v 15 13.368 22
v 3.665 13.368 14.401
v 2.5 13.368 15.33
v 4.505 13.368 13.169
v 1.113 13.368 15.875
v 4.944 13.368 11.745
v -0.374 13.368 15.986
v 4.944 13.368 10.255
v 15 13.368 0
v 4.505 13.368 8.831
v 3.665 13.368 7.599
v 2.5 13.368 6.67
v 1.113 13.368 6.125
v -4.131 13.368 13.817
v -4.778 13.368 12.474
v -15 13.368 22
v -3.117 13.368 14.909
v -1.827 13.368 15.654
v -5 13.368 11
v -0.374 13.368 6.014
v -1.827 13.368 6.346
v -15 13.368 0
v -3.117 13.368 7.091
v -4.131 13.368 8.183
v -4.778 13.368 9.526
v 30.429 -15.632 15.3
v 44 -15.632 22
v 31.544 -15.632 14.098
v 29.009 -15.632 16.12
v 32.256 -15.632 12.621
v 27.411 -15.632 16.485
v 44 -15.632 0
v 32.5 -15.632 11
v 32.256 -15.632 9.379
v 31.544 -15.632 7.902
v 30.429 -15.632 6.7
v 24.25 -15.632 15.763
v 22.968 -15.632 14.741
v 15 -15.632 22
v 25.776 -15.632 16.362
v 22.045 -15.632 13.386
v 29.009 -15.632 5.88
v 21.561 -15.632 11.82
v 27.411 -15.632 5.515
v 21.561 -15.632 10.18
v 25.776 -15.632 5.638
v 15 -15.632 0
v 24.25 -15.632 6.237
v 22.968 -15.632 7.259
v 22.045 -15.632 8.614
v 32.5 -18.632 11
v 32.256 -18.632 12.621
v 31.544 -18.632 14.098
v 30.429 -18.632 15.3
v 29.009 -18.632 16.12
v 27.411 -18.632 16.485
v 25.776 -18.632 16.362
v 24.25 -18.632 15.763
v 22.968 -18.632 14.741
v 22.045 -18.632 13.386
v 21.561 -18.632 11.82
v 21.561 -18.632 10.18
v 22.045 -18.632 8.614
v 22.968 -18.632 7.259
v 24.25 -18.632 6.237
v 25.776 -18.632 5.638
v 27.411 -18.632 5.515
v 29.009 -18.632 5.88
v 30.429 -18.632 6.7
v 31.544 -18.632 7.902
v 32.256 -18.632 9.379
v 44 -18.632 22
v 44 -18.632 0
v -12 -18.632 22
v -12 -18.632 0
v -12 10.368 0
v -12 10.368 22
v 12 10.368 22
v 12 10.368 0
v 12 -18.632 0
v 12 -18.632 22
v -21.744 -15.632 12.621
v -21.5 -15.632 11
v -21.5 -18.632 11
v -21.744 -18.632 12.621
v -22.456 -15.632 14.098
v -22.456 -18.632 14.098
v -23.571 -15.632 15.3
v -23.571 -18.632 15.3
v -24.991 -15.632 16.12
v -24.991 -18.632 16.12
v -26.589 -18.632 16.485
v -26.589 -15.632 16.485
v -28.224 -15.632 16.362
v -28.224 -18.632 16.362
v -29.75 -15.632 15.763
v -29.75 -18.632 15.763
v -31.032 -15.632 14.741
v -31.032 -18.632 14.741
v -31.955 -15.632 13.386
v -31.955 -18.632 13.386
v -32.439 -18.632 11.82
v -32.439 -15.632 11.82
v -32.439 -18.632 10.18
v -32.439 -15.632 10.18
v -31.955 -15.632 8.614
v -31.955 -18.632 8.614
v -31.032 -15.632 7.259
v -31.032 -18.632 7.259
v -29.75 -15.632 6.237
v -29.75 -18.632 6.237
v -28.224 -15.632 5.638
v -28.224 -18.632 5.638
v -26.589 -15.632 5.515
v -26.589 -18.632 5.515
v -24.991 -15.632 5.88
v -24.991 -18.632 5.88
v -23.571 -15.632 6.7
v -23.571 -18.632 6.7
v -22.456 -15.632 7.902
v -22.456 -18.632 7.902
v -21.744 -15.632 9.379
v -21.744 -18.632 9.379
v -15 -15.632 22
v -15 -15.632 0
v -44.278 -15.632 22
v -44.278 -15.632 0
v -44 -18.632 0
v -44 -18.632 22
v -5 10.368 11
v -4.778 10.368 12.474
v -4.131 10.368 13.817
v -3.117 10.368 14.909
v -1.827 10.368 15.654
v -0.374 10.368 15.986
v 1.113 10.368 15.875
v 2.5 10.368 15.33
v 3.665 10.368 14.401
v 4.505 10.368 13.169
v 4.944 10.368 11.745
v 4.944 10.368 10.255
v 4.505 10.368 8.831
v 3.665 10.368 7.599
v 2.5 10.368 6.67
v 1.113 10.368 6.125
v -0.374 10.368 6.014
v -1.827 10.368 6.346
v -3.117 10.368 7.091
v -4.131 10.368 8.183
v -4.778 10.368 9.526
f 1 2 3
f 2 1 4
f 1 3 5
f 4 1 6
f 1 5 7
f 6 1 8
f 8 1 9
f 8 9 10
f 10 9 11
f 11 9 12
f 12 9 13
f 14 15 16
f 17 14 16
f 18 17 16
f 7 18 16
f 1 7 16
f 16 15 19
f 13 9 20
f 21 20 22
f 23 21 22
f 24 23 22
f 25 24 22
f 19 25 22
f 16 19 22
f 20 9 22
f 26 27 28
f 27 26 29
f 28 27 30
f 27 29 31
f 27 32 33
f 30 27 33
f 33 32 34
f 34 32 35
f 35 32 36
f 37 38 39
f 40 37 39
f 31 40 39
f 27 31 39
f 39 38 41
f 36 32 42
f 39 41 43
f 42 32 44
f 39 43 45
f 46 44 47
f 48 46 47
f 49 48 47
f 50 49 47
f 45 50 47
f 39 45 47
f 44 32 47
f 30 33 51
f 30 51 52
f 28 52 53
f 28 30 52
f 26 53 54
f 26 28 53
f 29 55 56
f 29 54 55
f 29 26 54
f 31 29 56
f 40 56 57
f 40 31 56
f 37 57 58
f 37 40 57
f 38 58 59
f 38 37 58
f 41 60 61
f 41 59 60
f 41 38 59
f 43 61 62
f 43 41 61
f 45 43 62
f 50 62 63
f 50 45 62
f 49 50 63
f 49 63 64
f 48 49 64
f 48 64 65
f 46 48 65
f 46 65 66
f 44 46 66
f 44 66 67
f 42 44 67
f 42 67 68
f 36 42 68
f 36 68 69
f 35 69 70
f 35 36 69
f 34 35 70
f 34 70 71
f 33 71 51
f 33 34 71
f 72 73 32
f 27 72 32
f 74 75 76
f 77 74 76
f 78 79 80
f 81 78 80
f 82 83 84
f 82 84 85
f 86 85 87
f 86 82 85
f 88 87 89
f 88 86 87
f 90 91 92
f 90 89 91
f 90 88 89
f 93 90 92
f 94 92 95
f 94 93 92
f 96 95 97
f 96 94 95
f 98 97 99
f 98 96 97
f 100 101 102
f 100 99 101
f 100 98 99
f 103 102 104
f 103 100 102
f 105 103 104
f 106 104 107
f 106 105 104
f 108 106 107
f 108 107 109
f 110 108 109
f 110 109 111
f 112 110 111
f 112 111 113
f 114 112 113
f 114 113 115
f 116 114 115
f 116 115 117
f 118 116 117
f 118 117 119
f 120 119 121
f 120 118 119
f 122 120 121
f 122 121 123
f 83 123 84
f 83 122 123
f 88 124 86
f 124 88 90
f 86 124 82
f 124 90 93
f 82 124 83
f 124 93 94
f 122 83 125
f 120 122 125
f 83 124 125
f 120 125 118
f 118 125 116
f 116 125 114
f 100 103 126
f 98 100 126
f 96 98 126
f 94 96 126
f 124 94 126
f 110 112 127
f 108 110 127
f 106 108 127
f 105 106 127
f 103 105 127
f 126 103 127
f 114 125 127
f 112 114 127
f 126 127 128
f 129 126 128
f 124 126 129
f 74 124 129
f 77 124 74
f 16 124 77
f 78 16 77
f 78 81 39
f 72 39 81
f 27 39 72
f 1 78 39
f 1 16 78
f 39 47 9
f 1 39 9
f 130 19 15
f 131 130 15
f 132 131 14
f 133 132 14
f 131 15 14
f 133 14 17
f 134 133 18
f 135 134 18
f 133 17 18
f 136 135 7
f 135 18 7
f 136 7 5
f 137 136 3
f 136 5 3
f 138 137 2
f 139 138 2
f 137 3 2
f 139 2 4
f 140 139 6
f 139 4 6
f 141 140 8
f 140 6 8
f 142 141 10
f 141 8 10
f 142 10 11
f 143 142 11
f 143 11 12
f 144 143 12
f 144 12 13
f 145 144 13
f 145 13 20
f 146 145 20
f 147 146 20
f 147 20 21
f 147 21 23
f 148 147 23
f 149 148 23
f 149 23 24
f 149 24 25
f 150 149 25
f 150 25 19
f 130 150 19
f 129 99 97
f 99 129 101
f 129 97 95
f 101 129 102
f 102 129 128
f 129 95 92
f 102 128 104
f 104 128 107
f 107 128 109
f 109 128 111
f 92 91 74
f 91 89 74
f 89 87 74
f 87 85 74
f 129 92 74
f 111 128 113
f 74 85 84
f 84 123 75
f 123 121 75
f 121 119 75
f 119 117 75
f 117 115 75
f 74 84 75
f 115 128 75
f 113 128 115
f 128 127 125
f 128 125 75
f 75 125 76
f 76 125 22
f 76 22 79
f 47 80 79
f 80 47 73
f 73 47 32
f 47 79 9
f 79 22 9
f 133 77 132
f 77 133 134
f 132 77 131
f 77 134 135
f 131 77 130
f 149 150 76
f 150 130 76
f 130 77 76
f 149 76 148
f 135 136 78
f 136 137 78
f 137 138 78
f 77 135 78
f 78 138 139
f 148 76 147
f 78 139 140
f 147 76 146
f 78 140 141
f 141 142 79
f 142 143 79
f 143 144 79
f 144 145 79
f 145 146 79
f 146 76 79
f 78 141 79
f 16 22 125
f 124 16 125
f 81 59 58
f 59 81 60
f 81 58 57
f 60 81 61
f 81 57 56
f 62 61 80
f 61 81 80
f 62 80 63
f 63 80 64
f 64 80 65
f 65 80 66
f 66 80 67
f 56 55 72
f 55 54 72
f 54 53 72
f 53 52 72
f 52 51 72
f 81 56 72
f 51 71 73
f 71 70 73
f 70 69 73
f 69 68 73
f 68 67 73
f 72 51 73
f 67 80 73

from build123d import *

# Parameters (mm, degrees)
F1_DEPTH = 22
F2_R     = 5
F3_DEPTH = 10
F4_R     = 5.5
F5_DEPTH = 25


# Not quite as in the source:
# - a feature names something its author has since deleted; it is built from what else it names


with BuildPart() as f1:
    # F0 (on Top) → F1 (new body)
    with BuildSketch(Plane.XY):
        Polygon((-15, -15.631636476), (-44.2782626623, -15.631636476), (-44, -18.631636476), (-12, -18.631636476), (-12, 10.368363524), (12, 10.368363524), (12, -18.631636476), (44, -18.631636476), (44, -15.631636476), (15, -15.631636476), (15, 13.368363524), (-15, 13.368363524), align=None)
    extrude(amount=F1_DEPTH)

    # F2 (on face) → F3 (cut)
    with BuildSketch(Plane(origin=(0, 13.368363524, 0), x_dir=(-1, 0, 0), z_dir=(0, 1, 0))):
        with Locations((0, 11)):
            Circle(F2_R)
    extrude(amount=-F3_DEPTH, mode=Mode.SUBTRACT)

    # F4 (on Front) → F5 (cut)
    with BuildSketch(Plane.XZ):
        with Locations((27, 11)):
            Circle(F4_R)
        with Locations((-27, 11)):
            Circle(F4_R)
    extrude(amount=F5_DEPTH, mode=Mode.SUBTRACT)


solid = f1.part
